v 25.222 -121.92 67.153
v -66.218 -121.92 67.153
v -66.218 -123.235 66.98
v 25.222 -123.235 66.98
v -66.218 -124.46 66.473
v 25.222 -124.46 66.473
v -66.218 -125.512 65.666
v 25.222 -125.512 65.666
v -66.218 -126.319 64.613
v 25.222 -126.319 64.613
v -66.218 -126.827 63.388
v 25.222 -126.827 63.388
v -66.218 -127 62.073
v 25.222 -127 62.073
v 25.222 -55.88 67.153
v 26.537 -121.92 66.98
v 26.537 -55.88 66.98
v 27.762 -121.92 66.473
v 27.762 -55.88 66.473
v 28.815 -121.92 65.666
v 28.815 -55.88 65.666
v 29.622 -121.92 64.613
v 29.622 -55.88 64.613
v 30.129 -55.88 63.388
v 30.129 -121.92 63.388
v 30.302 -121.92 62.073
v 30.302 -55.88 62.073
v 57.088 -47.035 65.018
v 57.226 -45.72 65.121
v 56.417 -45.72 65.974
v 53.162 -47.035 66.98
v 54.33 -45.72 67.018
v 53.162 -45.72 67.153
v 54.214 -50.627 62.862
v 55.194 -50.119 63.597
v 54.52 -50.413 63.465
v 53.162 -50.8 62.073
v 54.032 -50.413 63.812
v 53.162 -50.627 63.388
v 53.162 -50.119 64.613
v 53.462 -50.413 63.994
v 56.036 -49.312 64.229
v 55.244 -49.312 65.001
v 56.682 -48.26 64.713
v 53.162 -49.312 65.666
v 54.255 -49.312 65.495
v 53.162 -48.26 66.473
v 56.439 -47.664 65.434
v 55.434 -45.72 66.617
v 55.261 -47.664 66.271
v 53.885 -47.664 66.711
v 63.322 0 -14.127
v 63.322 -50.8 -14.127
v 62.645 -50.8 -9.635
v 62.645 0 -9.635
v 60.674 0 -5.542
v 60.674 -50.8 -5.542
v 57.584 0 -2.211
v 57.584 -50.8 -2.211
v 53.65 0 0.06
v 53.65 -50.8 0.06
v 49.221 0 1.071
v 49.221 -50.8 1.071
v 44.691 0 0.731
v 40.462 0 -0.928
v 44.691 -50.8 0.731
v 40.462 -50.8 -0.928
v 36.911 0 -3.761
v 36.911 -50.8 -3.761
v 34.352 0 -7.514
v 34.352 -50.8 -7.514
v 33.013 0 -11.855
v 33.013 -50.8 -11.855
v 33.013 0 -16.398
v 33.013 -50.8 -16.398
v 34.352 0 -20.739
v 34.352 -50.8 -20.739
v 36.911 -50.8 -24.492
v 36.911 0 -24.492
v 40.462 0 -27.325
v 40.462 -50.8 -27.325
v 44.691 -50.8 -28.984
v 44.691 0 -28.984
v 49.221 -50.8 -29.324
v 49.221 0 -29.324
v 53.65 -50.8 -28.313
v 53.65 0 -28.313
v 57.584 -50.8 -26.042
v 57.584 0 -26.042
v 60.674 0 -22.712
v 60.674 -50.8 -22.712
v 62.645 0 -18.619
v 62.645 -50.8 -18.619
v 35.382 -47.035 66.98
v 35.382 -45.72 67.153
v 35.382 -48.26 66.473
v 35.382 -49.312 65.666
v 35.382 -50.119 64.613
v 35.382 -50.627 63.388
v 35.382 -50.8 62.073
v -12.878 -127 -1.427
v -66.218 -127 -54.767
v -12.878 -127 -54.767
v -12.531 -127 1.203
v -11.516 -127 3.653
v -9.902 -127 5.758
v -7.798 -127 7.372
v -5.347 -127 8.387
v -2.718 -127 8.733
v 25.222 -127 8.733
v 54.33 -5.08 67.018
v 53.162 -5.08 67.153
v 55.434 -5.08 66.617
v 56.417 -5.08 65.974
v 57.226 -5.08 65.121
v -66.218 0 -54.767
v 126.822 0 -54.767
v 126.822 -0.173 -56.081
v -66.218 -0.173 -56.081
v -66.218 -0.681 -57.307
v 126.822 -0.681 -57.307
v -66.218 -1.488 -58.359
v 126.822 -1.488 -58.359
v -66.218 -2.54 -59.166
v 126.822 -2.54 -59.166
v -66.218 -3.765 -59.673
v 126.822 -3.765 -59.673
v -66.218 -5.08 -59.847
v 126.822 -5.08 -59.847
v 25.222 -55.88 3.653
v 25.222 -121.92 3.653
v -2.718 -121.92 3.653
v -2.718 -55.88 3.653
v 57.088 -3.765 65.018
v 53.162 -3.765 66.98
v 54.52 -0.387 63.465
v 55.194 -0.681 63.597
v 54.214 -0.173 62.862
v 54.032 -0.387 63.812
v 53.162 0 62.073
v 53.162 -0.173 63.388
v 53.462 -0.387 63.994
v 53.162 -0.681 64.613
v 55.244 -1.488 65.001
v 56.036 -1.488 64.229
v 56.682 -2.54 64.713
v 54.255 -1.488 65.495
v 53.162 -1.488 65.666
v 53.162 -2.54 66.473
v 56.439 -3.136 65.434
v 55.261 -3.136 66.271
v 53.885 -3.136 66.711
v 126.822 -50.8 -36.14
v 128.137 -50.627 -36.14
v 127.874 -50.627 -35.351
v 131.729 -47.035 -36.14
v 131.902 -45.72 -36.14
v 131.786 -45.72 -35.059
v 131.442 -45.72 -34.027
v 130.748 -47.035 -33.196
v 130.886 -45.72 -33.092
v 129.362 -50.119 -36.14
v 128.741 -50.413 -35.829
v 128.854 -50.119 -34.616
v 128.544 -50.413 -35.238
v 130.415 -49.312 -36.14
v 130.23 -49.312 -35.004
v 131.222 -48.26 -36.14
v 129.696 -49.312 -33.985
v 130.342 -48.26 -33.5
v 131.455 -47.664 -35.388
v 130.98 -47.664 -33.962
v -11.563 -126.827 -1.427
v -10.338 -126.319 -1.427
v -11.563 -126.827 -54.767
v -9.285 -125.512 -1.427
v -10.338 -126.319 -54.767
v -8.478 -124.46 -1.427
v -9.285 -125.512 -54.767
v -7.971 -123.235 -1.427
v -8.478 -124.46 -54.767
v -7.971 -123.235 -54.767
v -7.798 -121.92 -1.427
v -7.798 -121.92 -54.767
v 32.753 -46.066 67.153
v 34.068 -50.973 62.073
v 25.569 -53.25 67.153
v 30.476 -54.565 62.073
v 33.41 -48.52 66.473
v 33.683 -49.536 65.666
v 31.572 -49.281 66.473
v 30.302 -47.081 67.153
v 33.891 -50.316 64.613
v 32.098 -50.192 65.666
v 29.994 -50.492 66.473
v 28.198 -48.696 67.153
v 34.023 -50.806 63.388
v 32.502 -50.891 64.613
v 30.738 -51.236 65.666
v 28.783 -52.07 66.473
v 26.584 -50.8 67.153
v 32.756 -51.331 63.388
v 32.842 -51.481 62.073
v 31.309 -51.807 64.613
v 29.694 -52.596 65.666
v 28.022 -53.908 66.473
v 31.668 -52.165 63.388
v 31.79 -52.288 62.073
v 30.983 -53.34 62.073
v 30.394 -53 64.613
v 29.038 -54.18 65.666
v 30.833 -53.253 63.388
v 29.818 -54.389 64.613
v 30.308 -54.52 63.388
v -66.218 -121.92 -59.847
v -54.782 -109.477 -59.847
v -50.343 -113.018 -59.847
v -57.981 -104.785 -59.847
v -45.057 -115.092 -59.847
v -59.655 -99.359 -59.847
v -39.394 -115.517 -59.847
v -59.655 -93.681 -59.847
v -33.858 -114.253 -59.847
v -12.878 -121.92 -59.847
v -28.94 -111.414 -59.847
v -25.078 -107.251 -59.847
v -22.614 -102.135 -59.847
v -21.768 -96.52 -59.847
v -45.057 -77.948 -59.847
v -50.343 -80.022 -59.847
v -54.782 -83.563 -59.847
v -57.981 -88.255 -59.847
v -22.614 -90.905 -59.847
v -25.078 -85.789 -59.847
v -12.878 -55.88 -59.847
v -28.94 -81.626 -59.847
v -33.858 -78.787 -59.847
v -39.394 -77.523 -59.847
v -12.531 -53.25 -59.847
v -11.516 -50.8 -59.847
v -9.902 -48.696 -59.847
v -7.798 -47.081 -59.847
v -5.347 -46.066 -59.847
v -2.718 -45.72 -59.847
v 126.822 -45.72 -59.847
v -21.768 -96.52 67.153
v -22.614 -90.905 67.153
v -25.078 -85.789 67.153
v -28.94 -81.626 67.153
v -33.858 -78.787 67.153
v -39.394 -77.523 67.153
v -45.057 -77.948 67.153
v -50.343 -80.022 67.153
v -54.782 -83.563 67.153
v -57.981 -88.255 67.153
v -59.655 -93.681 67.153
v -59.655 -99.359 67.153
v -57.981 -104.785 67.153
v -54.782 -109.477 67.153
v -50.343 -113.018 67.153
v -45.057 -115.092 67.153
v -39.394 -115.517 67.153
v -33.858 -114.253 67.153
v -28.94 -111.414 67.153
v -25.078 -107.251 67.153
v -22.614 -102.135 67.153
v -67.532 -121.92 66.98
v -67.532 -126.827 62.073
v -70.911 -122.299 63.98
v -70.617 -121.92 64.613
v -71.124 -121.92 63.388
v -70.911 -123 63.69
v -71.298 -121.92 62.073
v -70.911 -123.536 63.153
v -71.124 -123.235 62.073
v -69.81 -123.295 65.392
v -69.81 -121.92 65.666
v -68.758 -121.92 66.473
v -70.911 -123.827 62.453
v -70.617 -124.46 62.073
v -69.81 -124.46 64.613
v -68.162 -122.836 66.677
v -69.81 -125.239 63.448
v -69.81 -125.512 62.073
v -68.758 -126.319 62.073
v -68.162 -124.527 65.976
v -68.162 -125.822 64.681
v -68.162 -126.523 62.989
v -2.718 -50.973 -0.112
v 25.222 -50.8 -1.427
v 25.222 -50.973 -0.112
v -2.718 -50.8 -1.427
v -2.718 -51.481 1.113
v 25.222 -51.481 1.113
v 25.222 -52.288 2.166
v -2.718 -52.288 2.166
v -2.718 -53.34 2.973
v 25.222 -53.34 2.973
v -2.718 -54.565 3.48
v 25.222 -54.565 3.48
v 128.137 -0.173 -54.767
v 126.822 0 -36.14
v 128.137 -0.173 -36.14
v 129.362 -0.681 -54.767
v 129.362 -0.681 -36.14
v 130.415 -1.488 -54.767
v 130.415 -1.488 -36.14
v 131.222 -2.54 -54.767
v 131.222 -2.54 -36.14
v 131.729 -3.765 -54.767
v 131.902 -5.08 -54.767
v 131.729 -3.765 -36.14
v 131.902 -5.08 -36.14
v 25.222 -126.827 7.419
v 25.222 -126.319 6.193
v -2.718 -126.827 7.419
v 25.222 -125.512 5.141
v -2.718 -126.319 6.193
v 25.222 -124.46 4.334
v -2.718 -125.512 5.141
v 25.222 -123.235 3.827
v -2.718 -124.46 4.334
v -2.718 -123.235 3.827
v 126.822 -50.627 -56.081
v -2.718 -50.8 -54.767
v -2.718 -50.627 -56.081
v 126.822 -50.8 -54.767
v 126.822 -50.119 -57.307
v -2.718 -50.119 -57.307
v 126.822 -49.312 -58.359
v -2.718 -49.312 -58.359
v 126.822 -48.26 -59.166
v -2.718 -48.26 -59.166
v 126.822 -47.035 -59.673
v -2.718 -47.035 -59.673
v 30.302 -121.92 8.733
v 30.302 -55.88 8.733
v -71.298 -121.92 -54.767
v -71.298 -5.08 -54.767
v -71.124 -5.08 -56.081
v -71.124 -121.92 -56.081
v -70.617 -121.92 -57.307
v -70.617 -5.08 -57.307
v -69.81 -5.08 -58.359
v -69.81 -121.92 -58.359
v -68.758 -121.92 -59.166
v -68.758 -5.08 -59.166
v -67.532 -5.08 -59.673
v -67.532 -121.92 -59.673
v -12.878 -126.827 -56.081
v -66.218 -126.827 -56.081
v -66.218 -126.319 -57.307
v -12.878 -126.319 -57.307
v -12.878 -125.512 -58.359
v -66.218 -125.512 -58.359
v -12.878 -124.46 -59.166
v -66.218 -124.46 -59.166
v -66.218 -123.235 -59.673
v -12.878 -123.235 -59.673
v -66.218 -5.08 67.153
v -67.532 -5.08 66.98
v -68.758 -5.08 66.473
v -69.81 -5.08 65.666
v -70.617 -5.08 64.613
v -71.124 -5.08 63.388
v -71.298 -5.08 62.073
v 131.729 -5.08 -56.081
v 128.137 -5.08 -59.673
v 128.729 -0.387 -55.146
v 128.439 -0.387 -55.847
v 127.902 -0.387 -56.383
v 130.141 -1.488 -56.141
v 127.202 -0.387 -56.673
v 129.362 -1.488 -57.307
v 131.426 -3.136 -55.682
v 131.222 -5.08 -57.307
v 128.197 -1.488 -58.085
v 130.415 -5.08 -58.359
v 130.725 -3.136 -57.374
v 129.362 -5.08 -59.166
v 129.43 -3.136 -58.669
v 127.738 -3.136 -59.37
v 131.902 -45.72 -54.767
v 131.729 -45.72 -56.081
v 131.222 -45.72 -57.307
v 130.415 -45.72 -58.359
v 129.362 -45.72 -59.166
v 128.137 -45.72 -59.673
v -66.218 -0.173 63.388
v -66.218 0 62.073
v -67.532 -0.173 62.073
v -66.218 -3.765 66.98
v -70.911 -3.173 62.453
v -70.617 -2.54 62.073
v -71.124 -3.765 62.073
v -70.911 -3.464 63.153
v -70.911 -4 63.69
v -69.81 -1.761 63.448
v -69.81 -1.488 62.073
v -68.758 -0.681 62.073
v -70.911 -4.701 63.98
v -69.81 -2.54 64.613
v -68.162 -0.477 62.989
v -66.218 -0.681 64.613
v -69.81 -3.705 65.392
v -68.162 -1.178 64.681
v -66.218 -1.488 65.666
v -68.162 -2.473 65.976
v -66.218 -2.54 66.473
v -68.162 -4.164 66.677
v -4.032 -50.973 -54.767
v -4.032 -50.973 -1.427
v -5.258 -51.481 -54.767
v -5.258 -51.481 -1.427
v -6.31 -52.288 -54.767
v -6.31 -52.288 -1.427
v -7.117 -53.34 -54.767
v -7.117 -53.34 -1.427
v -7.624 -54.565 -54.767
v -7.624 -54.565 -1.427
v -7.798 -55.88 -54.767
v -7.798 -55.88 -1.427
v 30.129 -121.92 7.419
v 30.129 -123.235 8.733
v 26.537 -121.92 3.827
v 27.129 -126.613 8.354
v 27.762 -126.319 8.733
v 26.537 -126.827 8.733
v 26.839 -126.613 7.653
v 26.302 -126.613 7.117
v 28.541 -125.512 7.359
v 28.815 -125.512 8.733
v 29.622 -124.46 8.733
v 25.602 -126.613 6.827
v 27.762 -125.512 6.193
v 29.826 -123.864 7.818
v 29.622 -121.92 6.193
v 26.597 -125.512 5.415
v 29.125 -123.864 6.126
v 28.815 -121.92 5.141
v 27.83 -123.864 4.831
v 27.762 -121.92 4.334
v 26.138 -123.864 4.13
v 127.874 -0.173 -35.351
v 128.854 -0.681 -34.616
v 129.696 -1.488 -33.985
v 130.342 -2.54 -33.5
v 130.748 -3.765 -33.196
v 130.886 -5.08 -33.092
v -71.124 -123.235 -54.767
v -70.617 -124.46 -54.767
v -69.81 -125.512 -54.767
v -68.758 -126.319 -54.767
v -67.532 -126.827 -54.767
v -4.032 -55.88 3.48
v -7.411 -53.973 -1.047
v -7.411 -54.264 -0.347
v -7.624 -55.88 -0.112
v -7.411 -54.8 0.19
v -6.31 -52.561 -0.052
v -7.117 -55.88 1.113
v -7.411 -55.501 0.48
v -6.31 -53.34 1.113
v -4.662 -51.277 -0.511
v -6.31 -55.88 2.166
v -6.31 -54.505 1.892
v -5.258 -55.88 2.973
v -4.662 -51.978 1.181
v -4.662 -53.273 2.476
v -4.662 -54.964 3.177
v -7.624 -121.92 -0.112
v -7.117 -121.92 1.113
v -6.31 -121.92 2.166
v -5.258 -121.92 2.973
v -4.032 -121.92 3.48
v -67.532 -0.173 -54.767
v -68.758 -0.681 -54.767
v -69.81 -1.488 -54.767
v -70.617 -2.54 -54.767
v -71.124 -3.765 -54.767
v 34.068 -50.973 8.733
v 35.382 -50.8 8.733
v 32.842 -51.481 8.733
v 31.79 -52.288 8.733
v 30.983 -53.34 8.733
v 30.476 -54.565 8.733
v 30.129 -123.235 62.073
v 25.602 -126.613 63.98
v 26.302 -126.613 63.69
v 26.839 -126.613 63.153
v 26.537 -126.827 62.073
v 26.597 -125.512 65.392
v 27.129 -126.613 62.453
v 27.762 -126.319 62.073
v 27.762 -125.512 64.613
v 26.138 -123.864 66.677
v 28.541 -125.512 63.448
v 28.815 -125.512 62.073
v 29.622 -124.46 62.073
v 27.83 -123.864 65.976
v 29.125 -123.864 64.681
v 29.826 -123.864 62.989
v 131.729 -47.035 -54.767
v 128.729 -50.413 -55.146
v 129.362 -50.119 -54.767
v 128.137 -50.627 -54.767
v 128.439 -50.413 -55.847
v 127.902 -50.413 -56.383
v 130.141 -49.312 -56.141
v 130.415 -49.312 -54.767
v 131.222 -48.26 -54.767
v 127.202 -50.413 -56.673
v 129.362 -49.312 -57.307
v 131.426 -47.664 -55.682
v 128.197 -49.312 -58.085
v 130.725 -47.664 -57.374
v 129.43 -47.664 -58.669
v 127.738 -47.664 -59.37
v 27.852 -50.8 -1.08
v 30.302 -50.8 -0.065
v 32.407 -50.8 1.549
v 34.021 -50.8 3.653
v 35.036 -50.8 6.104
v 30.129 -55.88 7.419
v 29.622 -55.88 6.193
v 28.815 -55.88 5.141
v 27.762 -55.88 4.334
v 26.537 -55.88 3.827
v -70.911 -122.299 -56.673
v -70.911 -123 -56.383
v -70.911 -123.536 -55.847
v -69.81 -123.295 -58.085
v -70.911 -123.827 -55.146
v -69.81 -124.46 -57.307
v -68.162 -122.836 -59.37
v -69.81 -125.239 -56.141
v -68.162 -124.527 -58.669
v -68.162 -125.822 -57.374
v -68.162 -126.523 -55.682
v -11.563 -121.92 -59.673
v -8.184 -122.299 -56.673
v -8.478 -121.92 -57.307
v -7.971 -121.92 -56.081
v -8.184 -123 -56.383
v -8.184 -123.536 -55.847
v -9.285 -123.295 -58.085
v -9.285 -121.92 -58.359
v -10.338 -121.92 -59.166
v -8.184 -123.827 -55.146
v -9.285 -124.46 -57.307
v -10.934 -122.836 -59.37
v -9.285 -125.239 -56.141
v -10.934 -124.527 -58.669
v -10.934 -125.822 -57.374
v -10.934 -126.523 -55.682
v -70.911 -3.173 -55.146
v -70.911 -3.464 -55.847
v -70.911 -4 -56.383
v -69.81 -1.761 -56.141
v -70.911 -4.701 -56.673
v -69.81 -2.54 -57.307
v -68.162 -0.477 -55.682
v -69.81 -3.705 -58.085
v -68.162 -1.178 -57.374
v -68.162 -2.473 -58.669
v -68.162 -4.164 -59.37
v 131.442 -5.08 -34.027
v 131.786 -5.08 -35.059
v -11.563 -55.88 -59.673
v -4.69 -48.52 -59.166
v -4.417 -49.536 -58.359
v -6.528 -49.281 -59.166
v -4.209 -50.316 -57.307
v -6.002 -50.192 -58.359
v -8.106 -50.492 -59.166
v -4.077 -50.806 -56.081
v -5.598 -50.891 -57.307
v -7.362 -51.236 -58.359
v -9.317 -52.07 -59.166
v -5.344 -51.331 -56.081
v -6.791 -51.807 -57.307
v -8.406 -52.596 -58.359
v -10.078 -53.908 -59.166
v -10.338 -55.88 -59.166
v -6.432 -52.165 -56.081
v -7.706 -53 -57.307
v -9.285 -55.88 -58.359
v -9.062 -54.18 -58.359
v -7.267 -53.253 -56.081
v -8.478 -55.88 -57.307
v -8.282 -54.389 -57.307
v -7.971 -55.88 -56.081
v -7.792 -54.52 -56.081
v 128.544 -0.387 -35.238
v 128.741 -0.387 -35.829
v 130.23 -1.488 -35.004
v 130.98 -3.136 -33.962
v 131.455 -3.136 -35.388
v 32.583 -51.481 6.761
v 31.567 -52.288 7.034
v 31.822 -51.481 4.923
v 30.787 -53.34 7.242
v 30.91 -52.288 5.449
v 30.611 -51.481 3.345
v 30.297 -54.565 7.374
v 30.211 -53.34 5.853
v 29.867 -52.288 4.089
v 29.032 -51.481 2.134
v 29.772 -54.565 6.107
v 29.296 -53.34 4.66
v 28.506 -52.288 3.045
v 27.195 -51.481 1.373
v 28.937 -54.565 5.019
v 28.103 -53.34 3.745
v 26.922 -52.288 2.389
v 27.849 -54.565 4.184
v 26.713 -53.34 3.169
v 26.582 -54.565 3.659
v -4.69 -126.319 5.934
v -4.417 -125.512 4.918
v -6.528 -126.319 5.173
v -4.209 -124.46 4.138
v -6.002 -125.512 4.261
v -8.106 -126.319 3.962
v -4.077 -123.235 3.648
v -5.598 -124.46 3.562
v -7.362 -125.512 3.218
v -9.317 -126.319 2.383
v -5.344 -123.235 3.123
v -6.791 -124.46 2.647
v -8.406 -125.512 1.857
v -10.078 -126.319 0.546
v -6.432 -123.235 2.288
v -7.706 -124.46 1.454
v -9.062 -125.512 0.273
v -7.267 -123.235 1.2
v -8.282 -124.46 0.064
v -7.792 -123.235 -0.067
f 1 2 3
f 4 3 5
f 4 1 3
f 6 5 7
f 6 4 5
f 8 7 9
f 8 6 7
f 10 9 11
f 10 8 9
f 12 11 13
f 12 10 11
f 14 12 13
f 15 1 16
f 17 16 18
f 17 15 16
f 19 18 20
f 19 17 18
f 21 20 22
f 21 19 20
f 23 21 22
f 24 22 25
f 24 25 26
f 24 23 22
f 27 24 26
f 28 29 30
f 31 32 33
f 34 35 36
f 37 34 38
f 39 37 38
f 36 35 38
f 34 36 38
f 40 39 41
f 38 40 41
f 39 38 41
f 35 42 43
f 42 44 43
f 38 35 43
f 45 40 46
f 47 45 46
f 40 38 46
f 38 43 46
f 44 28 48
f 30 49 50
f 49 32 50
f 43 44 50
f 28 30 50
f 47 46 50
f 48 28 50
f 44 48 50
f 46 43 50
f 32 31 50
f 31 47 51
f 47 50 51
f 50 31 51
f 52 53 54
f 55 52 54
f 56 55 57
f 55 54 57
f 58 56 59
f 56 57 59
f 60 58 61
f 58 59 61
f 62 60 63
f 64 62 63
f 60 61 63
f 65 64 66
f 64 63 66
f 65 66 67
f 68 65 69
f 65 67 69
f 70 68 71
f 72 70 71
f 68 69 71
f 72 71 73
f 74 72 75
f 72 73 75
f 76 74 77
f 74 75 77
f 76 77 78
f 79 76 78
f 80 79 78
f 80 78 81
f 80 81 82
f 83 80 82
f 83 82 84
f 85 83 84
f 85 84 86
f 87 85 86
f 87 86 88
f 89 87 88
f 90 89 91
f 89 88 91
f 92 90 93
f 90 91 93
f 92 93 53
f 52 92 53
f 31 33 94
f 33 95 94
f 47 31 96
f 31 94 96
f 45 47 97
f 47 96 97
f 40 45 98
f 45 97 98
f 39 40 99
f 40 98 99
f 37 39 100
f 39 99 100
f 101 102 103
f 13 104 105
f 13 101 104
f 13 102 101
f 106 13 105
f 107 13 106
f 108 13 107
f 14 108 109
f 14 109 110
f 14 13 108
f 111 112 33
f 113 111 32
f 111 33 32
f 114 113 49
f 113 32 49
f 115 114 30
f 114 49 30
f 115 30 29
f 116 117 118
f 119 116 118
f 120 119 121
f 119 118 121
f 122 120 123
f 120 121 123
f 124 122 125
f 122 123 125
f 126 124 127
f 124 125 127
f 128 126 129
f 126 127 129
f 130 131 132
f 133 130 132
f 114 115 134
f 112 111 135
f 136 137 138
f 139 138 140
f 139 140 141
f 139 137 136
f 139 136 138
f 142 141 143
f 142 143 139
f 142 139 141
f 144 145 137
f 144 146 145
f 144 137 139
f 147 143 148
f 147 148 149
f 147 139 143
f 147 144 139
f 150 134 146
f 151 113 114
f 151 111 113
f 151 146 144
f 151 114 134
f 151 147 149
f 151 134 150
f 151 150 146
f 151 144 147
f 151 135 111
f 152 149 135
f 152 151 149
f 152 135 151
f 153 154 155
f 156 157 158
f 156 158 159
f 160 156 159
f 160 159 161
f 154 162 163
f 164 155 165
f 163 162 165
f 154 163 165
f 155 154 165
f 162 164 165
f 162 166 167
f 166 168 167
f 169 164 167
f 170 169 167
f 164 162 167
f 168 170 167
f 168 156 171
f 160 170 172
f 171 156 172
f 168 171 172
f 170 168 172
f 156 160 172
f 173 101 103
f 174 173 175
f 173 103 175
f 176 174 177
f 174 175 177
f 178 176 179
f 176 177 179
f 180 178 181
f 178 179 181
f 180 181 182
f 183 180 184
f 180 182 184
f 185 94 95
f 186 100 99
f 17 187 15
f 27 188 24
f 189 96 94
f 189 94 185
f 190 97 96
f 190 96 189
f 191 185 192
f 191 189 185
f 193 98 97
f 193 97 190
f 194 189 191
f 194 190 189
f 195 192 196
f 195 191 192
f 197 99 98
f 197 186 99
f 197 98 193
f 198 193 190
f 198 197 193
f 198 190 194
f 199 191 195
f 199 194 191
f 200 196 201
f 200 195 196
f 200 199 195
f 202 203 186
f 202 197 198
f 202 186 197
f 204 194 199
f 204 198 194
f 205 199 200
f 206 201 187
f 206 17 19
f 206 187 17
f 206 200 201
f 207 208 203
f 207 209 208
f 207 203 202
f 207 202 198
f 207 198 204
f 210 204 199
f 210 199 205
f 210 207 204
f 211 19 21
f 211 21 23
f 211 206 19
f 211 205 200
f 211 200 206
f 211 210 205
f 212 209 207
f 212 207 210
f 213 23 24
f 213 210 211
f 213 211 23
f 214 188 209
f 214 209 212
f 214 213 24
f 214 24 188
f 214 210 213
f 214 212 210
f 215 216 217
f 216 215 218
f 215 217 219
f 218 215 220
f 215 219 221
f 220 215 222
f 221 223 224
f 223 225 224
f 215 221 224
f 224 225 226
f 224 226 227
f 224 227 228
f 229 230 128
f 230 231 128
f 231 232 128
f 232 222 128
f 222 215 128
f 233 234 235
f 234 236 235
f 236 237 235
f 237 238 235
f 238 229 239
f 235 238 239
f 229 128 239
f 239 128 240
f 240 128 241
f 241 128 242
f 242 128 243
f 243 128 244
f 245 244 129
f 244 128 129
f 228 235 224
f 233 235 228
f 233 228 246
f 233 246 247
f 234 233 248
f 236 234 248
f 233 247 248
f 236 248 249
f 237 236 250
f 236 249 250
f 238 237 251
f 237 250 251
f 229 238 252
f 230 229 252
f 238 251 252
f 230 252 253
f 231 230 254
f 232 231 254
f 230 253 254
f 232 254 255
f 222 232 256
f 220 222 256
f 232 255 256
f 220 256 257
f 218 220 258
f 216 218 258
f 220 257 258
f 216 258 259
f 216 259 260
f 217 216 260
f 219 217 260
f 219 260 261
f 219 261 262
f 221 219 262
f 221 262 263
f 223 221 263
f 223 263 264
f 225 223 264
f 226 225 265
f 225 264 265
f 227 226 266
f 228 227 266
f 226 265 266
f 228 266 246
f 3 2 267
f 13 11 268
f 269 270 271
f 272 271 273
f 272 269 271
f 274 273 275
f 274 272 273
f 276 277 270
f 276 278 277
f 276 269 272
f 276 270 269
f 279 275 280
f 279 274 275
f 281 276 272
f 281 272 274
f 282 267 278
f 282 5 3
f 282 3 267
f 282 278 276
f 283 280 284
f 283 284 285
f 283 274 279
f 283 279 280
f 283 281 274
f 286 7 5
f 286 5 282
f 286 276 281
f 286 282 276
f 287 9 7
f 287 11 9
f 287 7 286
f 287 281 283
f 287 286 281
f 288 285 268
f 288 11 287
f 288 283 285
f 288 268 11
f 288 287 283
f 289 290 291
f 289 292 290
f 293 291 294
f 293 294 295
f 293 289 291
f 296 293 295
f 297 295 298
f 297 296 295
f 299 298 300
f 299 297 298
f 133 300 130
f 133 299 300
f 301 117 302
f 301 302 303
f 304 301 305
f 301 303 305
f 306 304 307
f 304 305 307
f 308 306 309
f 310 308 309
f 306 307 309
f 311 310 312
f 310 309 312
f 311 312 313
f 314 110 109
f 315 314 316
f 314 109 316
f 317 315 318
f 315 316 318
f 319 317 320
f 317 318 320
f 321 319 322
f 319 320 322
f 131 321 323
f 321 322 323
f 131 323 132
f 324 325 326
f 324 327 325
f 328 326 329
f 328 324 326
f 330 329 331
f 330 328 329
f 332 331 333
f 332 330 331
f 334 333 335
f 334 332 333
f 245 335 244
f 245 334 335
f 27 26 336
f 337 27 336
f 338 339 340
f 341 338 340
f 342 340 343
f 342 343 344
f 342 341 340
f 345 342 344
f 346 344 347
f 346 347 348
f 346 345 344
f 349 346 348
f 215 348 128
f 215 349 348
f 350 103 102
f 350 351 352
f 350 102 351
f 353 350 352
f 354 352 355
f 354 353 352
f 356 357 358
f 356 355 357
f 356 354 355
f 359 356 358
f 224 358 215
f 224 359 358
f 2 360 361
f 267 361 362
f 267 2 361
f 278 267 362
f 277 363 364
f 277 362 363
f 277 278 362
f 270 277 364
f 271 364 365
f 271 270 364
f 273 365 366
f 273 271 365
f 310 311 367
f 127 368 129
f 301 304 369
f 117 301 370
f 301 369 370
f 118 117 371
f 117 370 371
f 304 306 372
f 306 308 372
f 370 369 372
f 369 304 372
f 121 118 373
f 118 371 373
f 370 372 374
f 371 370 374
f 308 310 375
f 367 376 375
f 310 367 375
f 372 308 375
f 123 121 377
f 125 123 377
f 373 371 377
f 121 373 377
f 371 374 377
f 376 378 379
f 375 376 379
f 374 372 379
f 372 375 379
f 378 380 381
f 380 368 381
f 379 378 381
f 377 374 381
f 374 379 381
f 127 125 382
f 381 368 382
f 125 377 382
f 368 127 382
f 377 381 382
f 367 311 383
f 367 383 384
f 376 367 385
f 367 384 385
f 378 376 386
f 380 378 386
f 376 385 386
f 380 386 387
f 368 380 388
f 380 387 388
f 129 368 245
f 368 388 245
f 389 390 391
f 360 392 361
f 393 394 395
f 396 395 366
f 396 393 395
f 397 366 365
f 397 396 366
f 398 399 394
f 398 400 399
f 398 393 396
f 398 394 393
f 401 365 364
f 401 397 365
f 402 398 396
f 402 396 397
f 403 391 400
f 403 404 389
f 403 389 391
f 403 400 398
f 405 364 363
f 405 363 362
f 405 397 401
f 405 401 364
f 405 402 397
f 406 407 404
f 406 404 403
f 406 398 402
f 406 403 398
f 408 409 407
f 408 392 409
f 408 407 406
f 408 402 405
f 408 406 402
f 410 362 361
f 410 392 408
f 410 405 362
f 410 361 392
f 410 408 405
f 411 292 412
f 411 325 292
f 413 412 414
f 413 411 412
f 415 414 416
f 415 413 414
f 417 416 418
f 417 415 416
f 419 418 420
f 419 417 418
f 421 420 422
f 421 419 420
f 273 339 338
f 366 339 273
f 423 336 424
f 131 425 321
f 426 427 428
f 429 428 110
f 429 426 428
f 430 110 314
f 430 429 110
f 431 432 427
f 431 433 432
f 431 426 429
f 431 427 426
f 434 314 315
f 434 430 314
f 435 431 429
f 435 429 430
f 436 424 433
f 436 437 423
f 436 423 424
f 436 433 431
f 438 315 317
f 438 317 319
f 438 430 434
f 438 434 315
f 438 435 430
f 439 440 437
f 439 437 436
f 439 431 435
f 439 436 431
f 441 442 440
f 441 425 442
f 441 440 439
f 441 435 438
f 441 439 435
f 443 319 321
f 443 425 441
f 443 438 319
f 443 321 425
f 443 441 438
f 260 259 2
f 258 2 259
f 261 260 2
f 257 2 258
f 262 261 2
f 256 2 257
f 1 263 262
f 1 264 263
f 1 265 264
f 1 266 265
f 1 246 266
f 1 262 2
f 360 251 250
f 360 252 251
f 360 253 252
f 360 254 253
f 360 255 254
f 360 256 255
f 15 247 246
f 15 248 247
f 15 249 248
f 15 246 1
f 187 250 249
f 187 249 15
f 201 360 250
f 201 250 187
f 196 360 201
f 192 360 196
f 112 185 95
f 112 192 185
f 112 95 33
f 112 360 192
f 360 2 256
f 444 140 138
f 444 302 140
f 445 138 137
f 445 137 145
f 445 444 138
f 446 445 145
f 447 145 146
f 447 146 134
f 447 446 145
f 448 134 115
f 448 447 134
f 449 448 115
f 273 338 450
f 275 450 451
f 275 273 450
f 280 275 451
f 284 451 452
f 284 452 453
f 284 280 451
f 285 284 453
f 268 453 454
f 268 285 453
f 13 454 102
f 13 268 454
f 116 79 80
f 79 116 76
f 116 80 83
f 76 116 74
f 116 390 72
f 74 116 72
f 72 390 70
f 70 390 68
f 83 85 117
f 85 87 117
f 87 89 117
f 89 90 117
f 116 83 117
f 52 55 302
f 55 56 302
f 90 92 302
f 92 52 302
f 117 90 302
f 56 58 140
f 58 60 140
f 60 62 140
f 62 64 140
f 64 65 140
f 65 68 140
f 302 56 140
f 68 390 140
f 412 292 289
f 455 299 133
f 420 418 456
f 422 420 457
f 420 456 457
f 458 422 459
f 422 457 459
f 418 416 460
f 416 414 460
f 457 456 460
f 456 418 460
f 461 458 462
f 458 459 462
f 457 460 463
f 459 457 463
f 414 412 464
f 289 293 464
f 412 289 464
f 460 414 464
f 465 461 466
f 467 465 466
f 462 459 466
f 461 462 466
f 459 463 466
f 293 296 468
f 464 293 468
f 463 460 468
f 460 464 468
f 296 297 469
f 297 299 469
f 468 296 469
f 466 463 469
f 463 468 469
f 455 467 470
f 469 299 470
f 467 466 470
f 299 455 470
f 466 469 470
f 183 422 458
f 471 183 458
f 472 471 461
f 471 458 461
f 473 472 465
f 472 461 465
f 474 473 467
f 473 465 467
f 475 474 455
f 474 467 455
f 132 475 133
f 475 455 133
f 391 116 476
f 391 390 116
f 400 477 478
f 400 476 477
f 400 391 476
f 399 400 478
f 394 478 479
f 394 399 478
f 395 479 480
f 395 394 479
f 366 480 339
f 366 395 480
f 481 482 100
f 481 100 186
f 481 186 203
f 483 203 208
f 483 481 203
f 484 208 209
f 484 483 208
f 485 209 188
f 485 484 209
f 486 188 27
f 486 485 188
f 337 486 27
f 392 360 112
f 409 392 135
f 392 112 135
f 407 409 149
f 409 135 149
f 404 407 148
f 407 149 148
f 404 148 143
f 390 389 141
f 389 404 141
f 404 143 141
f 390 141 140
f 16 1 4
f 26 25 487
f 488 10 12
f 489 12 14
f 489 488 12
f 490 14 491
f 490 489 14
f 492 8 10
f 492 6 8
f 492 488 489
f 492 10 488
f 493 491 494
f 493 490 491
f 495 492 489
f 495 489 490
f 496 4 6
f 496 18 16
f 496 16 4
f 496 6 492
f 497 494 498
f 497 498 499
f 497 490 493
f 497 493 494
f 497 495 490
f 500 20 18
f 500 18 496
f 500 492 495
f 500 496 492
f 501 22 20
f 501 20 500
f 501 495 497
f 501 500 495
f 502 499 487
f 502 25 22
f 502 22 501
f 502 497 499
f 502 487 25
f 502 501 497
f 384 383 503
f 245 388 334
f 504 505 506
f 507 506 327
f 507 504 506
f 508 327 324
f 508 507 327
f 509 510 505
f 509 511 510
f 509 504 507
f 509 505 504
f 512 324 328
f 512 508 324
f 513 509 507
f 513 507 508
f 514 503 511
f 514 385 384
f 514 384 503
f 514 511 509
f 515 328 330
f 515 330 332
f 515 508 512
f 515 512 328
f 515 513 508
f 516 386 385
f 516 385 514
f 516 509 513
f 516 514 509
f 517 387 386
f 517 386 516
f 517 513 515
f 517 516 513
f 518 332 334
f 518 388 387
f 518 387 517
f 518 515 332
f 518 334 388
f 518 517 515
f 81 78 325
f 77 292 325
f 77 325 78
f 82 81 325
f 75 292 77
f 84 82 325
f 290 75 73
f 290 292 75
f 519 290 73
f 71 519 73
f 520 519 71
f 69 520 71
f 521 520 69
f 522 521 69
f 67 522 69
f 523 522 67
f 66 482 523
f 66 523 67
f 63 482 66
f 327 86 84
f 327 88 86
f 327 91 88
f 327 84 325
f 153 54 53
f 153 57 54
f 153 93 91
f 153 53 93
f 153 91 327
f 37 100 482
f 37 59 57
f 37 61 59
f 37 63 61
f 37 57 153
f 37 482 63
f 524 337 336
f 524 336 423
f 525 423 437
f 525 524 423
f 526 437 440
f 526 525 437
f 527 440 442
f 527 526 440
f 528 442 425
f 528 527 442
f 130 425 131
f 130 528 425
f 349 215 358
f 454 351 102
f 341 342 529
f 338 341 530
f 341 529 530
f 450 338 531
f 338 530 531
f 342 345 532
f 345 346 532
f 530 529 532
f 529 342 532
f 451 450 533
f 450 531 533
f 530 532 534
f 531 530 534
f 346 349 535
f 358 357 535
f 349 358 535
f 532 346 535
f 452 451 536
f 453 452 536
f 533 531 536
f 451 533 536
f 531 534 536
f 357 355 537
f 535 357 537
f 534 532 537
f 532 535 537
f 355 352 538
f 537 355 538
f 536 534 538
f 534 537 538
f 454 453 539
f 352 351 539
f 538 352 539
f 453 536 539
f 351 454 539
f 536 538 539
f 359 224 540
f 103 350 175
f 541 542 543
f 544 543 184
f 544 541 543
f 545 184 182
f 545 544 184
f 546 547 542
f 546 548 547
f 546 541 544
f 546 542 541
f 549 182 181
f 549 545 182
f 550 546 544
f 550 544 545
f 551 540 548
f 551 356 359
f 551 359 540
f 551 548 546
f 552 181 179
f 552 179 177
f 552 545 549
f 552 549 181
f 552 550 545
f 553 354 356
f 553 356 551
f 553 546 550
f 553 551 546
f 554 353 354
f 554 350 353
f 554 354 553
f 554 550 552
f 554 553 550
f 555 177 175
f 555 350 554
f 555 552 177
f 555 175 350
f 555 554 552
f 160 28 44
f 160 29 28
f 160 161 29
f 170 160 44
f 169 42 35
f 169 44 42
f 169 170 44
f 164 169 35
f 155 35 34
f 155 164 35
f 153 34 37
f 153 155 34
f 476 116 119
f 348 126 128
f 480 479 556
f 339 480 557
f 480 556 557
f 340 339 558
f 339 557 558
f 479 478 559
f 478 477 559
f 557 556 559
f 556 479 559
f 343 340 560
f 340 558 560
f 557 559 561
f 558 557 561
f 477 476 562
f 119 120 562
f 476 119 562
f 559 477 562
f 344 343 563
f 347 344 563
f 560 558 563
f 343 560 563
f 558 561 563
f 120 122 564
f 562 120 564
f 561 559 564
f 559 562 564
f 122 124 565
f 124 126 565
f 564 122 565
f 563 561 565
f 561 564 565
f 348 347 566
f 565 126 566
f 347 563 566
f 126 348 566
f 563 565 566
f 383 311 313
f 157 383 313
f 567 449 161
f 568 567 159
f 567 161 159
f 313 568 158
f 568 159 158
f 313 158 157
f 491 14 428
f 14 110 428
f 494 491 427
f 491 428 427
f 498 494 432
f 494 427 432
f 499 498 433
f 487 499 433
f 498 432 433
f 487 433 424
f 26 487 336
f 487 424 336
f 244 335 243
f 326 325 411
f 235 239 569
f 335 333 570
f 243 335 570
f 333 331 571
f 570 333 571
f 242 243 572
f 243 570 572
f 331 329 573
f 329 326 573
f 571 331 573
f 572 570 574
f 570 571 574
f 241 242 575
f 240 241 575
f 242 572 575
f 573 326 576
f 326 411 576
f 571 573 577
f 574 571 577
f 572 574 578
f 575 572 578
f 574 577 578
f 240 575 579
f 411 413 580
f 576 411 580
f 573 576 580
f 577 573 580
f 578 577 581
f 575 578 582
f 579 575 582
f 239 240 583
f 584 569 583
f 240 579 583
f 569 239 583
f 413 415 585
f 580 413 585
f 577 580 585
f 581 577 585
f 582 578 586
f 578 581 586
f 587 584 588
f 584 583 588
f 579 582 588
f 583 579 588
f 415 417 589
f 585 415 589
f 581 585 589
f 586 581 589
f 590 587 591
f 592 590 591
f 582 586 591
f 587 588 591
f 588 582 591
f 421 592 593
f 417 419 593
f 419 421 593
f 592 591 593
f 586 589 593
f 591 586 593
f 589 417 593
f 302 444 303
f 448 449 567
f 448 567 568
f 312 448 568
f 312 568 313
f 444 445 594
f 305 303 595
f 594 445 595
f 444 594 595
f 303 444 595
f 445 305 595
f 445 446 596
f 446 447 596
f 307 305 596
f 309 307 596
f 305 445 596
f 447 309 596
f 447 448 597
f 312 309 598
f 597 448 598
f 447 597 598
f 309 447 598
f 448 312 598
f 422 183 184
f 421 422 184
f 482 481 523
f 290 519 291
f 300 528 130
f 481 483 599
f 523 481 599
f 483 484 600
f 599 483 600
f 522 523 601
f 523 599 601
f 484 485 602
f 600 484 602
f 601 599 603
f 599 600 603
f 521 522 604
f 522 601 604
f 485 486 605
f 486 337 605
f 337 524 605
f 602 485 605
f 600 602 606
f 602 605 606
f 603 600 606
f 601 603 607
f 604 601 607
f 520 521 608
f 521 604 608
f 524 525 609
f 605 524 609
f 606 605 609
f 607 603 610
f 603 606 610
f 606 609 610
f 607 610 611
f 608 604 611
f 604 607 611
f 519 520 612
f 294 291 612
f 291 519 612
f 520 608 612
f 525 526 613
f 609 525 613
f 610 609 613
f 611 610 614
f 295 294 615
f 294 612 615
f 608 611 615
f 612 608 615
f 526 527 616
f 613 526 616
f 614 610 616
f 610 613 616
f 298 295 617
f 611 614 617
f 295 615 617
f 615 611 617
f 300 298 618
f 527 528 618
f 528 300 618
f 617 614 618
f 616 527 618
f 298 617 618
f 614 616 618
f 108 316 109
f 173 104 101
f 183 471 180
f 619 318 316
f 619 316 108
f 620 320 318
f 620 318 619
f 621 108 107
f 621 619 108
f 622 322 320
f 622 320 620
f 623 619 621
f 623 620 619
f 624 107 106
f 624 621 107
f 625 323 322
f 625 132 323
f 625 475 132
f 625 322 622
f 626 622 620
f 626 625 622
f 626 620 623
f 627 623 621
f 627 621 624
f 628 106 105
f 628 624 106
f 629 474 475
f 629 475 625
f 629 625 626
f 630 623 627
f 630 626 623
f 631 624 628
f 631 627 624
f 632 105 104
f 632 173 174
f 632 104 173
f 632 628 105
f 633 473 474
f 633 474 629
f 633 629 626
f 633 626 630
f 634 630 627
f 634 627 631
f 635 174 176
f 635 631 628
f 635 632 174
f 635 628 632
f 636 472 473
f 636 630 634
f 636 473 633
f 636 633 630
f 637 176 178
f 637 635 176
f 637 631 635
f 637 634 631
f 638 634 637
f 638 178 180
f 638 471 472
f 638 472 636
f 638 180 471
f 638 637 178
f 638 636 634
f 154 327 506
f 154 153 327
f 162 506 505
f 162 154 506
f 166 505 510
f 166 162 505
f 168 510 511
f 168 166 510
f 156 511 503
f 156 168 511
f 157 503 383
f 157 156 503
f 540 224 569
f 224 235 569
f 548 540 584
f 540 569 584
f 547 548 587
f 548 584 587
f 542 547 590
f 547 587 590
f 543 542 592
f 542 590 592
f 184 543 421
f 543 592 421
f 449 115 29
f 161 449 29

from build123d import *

# Parameters (mm, degrees)
F0_W      = 203.2
F0_H      = 127
F1_DEPTH  = 127
F3_DEPTH  = 76.2
F4_SIZE2  = 101.6
F4_SIZE   = 76.2
F5_R      = 5.08
F7_R      = 15.24
F8_DEPTH  = 50.8
F9_R      = 19.05
F10_DEPTH = 127


# Not quite as in the source:
# - a feature of the source that left no trace in its solid (it failed there, or was rolled back) is left out


with BuildPart() as f1:
    # F0 (on Front) → F1 (new body)
    with BuildSketch(Plane.XZ):
        with Locations((30.3024339037, 3.653427586)):
            Rectangle(F0_W, F0_H)
    extrude(amount=F1_DEPTH)

    # F2 (on face) → F3 (cut)
    with BuildSketch(Plane.XZ.offset(127)):
        Polygon((-7.7975660963, 3.653427586), (-7.7975660963, -59.846572414), (131.9024339037, -59.846572414), (131.9024339037, 67.153427586), (30.3024339037, 67.153427586), (30.3024339037, 3.653427586), align=None)
    extrude(amount=-F3_DEPTH, mode=Mode.SUBTRACT)

    # F4
    f4_edges = [f1.edges().sort_by_distance(p)[0] for p in [
        (131.902434, -25.4, 67.153428),
    ]]
    f4_side = f1.faces().sort_by_distance((8.531005, -52.614286, 67.153428))[0]
    chamfer(f4_edges, length=F4_SIZE, length2=F4_SIZE2, reference=f4_side)

    # F5
    f5_edges = [f1.edges().sort_by_distance(p)[0] for p in [
        (30.302434, -88.9, 67.153428),
        (-20.497566, -127, 67.153428),
        (55.702434, -25.4, 67.153428),
        (131.902434, -25.4, -34.446572),
        (131.902434, -25.4, -59.846572),
        (-39.547566, -127, -59.846572),
        (-7.797566, -88.9, -59.846572),
        (-7.797566, -127, -28.096572),
        (30.302434, -88.9, 3.653428),
        (30.302434, -127, 35.403428),
        (30.302434, -50.8, 35.403428),
        (11.252434, -50.8, 3.653428),
        (-7.797566, -50.8, -28.096572),
        (93.802434, 0, 16.353428),
        (131.902434, 0, -47.146572),
        (-7.797566, 0, 67.153428),
        (30.302434, 0, -59.846572),
        (-71.297566, 0, 3.653428),
        (-71.297566, -63.5, 67.153428),
        (-71.297566, -63.5, -59.846572),
        (131.902434, -50.8, -47.146572),
        (93.802434, -50.8, 16.353428),
        (62.052434, -50.8, -59.846572),
        (43.002434, -50.8, 67.153428),
        (-71.297566, -127, 3.653428),
        (-7.797566, -88.9, 3.653428),
        (11.252434, -127, 3.653428),
    ]]
    fillet(f5_edges, radius=F5_R)

    # F7 (on face) → F8 (cut, through all)
    with BuildSketch(Plane.XZ.offset(50.8)):
        with Locations((48.0824339037, -14.126572414)):
            Circle(F7_R)
    extrude(amount=-F8_DEPTH, mode=Mode.SUBTRACT)

    # F9 (on face) → F10 (cut, through all)
    with BuildSketch(Plane.XY.offset(67.153427586)):
        with Locations((-40.8175660963, -96.52)):
            Circle(F9_R)
    extrude(amount=-F10_DEPTH, mode=Mode.SUBTRACT)


solid = f1.part
